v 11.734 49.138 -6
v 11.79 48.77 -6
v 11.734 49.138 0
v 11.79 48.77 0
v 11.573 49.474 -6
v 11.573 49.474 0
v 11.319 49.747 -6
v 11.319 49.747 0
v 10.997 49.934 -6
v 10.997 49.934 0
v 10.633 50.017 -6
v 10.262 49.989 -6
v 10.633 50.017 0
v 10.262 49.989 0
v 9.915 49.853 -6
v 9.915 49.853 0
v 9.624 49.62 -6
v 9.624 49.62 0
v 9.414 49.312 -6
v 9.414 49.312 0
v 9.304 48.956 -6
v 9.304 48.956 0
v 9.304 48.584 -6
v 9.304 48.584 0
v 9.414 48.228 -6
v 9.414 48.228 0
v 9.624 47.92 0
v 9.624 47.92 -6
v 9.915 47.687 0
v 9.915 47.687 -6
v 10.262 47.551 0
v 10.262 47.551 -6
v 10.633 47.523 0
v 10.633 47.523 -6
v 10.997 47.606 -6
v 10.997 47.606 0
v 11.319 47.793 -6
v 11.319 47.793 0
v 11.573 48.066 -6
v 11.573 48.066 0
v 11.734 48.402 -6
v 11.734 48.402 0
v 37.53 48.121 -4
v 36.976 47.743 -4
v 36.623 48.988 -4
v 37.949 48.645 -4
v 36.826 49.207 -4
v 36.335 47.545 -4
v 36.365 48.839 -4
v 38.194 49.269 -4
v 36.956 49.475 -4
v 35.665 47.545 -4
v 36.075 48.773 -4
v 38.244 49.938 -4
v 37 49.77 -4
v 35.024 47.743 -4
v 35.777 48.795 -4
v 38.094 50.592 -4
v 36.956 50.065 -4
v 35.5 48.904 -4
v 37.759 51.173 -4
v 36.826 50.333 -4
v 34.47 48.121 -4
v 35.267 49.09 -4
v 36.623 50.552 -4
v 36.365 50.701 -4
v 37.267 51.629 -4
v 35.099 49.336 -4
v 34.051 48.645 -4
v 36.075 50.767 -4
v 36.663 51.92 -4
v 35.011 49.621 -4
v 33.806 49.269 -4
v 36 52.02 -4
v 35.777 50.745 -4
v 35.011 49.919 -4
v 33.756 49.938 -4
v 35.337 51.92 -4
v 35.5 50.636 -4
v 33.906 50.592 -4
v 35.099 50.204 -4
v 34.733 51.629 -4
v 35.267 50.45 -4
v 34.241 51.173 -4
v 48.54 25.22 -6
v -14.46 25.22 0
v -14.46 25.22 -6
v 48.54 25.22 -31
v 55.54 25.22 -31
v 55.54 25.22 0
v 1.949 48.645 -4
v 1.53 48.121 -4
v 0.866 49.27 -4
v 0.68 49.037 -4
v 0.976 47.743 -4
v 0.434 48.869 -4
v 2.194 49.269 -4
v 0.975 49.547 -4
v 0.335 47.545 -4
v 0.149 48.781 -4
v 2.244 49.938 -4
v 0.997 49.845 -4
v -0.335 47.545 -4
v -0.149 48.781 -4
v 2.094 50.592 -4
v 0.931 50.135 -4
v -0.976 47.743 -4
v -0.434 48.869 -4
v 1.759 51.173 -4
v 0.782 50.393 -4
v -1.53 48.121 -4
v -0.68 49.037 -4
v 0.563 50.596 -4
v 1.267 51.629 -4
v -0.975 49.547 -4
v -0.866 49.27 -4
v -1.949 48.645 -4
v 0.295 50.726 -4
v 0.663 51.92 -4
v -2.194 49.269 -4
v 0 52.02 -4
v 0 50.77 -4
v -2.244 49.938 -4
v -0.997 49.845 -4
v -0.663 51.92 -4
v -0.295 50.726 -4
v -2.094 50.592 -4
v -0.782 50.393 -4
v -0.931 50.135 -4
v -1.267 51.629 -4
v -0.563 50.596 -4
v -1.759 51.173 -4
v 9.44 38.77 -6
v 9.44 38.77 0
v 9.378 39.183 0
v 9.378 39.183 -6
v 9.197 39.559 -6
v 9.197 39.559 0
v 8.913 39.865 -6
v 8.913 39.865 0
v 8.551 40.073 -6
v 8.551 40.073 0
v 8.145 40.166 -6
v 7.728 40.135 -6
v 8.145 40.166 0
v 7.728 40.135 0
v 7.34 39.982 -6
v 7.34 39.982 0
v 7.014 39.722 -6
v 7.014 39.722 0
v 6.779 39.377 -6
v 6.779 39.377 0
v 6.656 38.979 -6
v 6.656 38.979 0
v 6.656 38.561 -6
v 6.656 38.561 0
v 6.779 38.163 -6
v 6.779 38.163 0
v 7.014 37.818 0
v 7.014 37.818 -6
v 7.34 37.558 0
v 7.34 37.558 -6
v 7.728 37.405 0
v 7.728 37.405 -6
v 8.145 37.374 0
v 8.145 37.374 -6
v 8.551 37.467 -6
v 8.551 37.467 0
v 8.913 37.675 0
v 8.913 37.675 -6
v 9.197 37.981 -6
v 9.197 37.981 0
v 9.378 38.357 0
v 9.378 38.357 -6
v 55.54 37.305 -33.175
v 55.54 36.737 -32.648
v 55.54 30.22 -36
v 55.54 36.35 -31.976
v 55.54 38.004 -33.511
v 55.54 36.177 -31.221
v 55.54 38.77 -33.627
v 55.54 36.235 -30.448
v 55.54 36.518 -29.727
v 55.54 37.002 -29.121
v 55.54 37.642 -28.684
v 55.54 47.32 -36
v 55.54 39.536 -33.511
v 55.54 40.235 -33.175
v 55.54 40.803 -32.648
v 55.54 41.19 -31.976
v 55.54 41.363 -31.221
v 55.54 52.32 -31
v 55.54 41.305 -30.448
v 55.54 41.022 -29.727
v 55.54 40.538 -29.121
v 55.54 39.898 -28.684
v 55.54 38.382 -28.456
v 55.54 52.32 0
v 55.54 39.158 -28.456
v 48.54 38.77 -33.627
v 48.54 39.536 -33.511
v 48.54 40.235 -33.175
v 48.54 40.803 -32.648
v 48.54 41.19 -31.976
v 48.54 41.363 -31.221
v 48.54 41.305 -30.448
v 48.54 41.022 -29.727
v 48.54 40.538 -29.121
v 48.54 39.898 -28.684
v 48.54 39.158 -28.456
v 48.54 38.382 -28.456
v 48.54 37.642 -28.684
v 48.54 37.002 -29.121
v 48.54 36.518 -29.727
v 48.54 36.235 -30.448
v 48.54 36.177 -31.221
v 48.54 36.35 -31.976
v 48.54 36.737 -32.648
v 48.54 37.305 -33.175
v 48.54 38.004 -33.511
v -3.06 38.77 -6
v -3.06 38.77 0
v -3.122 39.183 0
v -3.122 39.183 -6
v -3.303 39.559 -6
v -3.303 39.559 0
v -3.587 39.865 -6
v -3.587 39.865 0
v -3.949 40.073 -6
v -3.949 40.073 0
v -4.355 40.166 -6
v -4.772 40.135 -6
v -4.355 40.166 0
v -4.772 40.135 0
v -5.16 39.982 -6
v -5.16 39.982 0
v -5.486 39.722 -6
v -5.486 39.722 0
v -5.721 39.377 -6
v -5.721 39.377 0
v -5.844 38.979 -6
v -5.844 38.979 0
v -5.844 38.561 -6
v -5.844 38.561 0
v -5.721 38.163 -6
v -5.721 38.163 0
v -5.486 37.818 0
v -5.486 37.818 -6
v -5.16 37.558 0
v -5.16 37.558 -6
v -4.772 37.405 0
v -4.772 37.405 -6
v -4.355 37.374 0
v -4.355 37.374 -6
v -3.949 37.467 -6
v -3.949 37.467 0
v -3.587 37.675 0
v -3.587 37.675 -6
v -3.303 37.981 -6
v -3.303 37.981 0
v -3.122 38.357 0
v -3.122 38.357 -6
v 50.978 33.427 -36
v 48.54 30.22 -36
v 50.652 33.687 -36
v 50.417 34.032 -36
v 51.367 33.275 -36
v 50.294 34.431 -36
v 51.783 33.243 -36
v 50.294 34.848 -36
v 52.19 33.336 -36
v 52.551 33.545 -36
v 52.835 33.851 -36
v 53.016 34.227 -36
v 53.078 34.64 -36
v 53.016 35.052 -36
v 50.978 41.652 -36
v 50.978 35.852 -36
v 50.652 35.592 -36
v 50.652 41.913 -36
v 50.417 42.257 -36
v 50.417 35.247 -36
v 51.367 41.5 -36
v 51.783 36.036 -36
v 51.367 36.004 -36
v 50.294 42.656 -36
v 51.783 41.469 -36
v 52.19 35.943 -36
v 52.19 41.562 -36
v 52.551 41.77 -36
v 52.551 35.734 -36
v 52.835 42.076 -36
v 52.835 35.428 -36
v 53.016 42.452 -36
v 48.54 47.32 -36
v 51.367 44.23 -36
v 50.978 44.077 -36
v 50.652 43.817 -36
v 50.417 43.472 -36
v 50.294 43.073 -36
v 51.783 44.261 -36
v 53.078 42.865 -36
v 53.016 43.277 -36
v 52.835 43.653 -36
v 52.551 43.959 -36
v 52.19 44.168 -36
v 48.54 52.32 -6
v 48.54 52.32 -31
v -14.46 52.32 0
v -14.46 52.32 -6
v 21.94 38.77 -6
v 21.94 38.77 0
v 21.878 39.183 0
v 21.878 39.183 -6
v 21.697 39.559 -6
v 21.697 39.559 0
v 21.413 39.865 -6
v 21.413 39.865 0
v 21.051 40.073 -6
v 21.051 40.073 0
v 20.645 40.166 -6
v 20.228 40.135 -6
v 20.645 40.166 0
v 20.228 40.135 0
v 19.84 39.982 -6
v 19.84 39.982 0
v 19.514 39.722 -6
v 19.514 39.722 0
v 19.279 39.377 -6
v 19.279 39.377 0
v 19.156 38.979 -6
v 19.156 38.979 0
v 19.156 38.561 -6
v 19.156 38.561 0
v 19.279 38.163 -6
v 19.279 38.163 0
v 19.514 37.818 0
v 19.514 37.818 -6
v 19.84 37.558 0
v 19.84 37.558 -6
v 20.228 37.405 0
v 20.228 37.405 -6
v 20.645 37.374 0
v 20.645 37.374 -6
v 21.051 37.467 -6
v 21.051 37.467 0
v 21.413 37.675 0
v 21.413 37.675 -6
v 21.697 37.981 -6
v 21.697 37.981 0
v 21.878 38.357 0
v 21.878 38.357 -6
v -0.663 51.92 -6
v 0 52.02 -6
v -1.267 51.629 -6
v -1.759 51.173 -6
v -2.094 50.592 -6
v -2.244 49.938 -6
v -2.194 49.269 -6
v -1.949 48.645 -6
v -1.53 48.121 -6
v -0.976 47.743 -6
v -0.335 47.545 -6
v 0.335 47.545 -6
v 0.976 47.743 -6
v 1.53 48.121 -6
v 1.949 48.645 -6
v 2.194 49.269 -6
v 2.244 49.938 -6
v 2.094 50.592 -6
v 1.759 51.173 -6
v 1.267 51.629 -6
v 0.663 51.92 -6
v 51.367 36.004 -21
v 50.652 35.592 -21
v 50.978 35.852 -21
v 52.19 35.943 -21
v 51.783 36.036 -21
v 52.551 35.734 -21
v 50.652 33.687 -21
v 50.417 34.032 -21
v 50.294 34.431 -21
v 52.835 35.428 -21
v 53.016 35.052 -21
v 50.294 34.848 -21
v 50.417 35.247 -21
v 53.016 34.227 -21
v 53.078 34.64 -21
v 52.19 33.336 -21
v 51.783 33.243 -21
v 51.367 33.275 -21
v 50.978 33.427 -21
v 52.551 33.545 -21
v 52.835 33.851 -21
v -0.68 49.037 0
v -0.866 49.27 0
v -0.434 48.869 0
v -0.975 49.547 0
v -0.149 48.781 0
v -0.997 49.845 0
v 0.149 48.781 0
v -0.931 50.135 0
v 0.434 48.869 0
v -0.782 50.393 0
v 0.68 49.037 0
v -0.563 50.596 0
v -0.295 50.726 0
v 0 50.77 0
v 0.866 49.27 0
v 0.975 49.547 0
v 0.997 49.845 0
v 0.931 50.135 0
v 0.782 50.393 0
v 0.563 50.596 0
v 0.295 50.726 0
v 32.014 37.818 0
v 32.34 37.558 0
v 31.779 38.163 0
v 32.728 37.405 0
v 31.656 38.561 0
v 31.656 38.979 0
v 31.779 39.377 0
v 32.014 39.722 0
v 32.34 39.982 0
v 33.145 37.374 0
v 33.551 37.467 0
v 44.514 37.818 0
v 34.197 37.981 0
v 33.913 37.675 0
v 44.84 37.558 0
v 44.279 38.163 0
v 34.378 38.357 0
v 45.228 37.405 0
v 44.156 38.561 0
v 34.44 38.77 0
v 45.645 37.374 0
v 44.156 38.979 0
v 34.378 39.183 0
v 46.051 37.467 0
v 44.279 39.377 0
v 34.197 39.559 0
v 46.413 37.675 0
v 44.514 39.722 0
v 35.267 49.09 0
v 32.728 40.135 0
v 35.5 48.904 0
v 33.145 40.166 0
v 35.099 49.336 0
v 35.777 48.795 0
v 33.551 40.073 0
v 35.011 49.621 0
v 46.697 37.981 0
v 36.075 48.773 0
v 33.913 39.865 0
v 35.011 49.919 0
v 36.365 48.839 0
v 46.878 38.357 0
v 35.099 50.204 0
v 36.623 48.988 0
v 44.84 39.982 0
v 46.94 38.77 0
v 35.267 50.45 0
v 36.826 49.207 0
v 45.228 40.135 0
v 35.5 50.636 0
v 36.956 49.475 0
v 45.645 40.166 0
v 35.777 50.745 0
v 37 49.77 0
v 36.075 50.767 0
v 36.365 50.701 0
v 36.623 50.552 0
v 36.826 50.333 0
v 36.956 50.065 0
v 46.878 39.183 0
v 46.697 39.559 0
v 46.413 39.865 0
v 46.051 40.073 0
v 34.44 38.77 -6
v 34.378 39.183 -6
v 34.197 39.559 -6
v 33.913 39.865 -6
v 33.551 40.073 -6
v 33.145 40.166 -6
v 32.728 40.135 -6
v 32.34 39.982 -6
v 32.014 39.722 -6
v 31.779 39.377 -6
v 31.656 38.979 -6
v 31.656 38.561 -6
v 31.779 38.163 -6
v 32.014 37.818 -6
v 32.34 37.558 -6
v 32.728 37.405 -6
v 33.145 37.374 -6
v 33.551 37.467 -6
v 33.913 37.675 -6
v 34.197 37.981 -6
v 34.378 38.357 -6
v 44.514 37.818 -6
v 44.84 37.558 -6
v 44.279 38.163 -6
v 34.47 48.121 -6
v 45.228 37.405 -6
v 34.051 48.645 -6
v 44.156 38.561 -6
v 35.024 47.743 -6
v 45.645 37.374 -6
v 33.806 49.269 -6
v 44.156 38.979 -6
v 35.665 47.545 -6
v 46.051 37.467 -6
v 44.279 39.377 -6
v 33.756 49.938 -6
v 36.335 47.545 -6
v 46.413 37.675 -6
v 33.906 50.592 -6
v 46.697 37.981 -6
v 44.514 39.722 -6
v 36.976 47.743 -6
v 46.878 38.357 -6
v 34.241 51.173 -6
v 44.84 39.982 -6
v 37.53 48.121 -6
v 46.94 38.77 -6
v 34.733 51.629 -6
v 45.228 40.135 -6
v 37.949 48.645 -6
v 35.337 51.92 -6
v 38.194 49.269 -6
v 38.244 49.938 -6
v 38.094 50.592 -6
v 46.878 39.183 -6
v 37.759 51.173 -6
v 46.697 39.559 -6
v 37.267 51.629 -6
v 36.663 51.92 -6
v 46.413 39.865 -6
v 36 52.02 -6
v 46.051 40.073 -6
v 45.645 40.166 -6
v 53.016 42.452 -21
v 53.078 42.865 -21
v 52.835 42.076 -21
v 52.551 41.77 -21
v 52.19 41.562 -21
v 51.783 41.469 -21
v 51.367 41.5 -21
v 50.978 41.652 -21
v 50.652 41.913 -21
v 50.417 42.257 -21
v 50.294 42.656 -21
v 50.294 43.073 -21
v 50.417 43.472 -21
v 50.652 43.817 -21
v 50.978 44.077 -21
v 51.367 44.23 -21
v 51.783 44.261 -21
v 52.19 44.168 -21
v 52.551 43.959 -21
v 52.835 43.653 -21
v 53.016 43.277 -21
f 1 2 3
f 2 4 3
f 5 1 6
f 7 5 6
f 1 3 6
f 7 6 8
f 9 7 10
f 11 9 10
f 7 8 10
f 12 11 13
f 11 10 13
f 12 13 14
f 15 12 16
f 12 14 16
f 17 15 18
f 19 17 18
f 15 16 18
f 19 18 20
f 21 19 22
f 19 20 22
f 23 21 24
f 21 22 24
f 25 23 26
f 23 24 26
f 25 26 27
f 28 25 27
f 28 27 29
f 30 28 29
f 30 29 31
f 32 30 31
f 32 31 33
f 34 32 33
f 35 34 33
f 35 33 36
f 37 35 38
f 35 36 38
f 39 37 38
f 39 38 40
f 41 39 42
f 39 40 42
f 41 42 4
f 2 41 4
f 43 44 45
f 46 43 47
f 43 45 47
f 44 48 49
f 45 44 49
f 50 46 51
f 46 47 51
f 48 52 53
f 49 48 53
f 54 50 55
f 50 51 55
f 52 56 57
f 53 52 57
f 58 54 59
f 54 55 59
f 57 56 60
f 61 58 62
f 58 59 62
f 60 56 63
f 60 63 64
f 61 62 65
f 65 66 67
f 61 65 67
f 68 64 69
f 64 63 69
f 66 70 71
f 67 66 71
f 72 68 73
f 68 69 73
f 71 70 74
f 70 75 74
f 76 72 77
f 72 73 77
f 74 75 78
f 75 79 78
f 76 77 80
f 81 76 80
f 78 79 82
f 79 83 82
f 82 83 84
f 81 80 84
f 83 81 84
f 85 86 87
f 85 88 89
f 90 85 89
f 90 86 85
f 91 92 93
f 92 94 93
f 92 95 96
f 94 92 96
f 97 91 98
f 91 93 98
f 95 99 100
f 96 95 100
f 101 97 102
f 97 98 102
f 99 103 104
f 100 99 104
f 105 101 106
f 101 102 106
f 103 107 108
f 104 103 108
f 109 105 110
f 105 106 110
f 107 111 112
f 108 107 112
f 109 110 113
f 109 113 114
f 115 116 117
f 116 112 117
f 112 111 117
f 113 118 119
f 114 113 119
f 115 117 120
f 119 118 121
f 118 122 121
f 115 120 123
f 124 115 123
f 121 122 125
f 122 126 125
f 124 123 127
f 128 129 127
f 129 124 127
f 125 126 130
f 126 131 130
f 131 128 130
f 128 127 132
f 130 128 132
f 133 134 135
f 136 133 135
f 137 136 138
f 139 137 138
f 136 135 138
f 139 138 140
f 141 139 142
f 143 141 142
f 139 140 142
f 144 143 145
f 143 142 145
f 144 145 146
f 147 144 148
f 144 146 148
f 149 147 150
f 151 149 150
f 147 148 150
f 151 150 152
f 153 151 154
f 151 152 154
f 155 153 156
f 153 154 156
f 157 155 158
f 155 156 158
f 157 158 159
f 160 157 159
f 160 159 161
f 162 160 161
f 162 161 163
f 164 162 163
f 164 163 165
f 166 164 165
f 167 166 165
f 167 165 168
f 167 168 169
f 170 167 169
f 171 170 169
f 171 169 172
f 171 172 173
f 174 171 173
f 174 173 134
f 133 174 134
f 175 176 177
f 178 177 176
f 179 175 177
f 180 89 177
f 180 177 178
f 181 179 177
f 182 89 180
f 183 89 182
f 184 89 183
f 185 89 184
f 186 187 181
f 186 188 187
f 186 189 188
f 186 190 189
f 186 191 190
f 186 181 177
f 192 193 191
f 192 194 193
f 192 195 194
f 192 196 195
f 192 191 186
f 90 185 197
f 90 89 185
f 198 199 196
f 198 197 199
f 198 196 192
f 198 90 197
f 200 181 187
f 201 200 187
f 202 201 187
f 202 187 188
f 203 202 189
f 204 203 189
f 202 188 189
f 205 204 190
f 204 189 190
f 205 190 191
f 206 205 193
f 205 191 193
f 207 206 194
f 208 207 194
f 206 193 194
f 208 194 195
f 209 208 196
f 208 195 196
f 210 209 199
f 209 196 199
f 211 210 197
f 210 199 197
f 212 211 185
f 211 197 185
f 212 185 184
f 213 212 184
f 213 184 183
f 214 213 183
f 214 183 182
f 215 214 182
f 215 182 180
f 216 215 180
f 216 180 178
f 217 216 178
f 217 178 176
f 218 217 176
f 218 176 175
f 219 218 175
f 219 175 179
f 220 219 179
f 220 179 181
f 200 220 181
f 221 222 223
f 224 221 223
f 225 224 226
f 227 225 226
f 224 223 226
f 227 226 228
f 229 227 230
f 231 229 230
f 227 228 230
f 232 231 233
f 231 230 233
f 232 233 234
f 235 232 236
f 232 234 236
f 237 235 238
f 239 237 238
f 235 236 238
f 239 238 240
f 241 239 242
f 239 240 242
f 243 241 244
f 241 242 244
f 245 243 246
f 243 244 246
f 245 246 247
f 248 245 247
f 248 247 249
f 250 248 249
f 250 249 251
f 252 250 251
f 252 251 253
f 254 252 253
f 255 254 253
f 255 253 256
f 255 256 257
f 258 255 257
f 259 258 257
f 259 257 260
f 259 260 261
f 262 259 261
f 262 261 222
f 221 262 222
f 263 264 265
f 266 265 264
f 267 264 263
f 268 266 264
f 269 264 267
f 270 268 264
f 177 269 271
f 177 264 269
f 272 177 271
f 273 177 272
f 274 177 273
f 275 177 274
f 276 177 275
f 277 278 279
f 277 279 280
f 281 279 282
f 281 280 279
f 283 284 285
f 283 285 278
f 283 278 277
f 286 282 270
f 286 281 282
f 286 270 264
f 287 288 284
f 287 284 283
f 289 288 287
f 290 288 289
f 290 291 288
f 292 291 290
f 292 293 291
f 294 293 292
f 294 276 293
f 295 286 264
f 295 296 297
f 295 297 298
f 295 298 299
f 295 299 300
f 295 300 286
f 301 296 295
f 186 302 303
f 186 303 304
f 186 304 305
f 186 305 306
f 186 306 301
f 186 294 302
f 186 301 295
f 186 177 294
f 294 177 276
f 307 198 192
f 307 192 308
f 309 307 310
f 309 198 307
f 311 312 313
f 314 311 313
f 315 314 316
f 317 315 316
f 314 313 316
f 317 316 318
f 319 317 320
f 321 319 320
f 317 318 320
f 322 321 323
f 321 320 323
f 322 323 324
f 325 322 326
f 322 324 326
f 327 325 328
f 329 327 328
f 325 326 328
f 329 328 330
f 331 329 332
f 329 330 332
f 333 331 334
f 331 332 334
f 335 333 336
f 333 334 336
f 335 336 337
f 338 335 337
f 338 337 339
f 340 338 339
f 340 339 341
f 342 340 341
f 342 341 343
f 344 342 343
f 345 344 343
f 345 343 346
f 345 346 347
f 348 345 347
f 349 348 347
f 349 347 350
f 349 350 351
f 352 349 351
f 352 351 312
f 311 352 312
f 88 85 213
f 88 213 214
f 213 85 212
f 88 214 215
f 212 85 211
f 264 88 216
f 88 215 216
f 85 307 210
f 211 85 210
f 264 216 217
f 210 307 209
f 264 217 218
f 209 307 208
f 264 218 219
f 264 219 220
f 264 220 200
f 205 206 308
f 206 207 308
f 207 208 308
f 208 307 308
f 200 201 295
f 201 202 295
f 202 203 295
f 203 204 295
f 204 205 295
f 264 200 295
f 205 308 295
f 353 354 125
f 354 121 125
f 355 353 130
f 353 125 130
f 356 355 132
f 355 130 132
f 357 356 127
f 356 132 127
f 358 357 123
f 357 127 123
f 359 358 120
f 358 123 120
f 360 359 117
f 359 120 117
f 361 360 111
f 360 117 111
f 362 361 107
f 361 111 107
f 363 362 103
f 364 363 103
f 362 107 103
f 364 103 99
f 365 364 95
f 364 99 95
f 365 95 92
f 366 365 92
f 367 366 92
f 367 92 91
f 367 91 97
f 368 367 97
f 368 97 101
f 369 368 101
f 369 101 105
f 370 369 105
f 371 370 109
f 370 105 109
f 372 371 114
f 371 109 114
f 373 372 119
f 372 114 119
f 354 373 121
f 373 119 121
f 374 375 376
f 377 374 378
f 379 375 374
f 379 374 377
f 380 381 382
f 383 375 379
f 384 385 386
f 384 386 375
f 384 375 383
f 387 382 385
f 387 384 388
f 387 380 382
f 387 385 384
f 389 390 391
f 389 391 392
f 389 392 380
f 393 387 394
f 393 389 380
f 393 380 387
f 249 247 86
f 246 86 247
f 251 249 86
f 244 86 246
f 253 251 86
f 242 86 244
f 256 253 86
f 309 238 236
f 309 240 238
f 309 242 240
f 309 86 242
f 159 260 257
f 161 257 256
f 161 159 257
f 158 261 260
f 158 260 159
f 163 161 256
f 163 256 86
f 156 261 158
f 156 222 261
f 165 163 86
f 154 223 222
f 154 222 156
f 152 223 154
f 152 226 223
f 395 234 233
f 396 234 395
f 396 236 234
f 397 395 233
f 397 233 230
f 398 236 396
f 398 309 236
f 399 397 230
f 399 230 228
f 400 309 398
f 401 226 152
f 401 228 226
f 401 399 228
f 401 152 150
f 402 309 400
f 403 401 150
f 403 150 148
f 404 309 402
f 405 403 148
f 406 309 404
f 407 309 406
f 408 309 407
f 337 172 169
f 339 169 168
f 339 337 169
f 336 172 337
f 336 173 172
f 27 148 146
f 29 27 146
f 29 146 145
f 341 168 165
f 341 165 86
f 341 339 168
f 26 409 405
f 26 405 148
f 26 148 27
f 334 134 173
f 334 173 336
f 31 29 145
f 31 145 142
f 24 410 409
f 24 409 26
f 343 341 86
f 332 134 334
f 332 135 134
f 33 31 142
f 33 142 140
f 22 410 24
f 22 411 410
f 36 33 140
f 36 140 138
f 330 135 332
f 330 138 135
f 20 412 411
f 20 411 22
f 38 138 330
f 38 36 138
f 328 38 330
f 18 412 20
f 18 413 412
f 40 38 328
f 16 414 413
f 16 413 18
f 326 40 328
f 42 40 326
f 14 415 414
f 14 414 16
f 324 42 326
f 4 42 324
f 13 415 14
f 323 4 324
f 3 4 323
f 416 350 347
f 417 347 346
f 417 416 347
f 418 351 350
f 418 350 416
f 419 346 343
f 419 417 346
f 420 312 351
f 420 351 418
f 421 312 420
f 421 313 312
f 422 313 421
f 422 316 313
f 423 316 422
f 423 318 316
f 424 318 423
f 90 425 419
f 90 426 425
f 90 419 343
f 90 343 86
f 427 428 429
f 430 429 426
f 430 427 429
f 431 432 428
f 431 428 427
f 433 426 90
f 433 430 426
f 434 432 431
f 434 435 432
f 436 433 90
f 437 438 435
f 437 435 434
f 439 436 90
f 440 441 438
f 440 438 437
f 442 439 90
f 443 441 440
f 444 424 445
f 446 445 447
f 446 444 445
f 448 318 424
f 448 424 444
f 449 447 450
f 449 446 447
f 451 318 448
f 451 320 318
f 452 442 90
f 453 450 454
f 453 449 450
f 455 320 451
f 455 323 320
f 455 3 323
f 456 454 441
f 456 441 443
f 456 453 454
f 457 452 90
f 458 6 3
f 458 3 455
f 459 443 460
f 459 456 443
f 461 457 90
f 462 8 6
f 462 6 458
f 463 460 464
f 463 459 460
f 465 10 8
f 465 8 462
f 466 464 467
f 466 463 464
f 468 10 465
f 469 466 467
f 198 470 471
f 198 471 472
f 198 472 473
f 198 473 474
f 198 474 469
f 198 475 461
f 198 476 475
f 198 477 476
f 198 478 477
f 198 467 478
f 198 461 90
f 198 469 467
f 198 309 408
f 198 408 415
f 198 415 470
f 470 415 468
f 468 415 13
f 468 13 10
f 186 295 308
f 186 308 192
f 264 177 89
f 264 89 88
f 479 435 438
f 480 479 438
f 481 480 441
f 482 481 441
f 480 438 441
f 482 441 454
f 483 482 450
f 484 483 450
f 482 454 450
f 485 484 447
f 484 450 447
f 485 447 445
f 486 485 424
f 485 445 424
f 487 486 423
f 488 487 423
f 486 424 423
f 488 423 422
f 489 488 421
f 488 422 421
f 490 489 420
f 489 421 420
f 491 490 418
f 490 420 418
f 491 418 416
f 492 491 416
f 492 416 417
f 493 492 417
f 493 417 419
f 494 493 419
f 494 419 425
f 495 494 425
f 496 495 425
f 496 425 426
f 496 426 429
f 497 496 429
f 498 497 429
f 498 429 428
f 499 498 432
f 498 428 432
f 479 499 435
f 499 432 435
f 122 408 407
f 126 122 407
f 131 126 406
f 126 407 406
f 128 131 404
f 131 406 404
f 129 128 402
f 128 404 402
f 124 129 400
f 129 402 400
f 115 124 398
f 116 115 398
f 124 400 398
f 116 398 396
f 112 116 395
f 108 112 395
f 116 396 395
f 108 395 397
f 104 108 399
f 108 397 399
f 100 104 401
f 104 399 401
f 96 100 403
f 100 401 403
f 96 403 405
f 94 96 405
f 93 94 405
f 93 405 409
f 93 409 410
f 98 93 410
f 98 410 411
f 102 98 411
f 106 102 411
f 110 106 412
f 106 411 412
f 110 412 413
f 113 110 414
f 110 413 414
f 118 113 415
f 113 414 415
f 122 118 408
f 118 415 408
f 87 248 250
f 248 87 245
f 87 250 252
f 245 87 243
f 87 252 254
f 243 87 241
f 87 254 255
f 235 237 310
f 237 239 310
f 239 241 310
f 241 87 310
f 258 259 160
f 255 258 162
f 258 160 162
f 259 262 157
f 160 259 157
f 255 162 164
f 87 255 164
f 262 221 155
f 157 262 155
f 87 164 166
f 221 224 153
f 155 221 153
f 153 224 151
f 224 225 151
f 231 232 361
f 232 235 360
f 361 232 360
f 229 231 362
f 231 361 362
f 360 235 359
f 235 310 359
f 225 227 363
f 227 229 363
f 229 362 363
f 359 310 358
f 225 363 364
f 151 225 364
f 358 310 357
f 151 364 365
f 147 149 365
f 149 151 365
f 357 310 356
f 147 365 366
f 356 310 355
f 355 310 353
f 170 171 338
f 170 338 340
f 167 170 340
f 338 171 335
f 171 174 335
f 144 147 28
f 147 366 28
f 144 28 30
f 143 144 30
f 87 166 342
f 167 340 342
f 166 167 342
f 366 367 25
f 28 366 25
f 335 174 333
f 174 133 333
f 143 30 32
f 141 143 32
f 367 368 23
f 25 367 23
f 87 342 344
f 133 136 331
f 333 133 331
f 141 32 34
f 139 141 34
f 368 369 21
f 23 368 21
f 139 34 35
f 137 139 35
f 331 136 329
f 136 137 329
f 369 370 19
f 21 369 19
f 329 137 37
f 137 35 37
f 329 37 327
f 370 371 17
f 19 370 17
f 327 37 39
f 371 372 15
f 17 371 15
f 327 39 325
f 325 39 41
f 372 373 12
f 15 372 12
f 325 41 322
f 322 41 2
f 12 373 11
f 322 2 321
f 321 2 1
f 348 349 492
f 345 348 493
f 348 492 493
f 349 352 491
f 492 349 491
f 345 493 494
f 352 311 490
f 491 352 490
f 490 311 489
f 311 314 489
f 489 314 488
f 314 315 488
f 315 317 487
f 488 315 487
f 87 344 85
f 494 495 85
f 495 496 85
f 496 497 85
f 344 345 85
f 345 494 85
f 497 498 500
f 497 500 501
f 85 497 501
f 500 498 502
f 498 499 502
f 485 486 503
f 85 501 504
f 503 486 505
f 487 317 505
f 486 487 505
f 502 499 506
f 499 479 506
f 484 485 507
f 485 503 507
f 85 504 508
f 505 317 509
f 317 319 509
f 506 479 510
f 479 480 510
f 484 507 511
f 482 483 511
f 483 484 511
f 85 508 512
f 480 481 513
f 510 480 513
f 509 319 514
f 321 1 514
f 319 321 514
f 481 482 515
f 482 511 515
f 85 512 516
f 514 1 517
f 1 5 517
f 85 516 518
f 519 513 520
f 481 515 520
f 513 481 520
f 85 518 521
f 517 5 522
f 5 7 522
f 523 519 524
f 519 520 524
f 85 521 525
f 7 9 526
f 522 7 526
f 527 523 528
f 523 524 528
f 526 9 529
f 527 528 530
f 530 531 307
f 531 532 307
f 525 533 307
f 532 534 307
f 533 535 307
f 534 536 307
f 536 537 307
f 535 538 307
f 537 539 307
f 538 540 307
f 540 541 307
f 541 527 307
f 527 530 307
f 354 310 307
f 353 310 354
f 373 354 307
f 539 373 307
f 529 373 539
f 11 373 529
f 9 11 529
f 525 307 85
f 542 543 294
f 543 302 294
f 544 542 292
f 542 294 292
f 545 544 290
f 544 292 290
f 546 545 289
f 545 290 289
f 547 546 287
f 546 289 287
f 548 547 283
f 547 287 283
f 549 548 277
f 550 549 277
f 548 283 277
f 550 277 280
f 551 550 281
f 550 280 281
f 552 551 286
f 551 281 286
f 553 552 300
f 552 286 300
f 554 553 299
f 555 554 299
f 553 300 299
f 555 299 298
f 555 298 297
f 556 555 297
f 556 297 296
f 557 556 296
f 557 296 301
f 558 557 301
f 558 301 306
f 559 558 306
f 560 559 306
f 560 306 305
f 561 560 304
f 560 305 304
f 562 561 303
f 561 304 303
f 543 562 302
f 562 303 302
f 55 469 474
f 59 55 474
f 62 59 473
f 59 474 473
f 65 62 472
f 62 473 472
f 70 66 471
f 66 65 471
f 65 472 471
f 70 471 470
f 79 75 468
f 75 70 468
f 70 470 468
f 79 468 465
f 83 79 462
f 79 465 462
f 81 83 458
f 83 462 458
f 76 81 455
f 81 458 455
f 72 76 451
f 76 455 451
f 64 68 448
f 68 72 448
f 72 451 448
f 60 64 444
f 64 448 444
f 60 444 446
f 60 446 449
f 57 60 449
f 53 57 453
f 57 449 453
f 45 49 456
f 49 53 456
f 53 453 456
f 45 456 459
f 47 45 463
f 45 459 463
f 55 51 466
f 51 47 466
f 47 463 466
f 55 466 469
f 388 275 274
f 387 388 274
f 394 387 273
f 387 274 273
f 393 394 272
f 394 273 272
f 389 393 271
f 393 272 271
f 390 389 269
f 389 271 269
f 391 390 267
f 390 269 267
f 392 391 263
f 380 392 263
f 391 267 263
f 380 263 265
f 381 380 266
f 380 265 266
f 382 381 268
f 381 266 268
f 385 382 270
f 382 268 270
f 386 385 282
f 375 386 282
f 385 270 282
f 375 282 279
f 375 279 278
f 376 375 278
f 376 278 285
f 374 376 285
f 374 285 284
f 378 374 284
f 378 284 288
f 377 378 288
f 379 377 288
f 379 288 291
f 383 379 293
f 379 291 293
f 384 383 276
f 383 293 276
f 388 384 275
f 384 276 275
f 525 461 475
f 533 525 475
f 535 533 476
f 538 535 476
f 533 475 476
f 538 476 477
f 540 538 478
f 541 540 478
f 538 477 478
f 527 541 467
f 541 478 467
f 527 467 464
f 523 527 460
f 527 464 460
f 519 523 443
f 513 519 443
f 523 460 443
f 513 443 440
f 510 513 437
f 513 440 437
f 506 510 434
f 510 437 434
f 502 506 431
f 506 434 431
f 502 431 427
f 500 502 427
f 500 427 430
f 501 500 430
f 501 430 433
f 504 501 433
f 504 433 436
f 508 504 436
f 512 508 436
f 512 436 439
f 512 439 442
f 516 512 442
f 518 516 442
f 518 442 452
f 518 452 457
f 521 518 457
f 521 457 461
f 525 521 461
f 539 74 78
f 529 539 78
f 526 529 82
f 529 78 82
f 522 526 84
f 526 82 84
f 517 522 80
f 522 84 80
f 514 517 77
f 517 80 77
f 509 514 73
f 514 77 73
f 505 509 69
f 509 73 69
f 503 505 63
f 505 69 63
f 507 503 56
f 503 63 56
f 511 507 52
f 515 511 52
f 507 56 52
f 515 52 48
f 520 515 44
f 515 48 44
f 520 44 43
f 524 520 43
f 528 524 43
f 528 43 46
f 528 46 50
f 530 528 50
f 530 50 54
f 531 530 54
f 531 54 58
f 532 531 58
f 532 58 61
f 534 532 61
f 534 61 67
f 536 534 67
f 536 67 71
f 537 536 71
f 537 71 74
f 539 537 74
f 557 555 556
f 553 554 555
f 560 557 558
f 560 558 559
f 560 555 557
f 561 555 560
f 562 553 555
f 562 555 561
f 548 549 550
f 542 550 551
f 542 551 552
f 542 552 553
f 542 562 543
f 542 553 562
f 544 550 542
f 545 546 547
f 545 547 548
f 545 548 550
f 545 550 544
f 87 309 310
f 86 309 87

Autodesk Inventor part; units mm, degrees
ref_plane "YZ Plane" through (0, 0, 0) normal (1, 0, 0) x (0, 1, 0)
ref_plane "XZ Plane" through (0, 0, 0) normal (0, 1, 0) x (-1, 0, 0)
ref_plane "Arbeitsebene1" through (0, 0, 0) normal (0, 0, 1) x (1, 0, 0)
sketch "Skizze1" plane through (0, 0, 0) normal (0, 0, 1) x (1, 0, 0)
  circle A0 centre (-64.84, -24.91) radius 1.5 projected
  circle A1 centre (85.34, -22.83) radius 1 projected
  circle A2 centre (85.34, -43.41) radius 1 projected
  circle A3 centre (-64.84, 35.59) radius 1.5 projected
  circle A4 centre (-11.66, -50.59) radius 1.5 projected
  circle A5 centre (85.34, 37.77) radius 1 projected
  circle A6 centre (54.34, -50.59) radius 1.5 projected
  circle A7 centre (85.34, 58.59) radius 1 projected
  line L0 (-89.84, 67.09) -> (89.84, 67.09) projected
  line L1 (-89.84, -67.09) -> (-89.84, 67.09) projected
  line L2 (89.84, -67.09) -> (-89.84, -67.09) projected
  line L3 (89.84, 67.09) -> (89.84, -67.09) projected
  arc A8 (-32.14, 53.27) -> (-37.14, 48.27) centre (-32.14, 48.27) ccw projected
  line L4 (73.22, 53.27) -> (-32.14, 53.27) projected
  arc A9 (78.22, 48.27) -> (73.22, 53.27) centre (73.22, 48.27) ccw projected
  line L5 (78.22, -36.73) -> (78.22, 48.27) projected
  arc A10 (73.22, -41.73) -> (78.22, -36.73) centre (73.22, -36.73) ccw projected
  line L6 (-32.14, -41.73) -> (73.22, -41.73) projected
  arc A11 (-37.14, -36.73) -> (-32.14, -41.73) centre (-32.14, -36.73) ccw projected
  line L7 (-37.14, 48.27) -> (-37.14, -36.73) projected
  circle A12 centre (37.4417, 38.67) radius 1.75 projected
  circle A13 centre (24.9417, 38.67) radius 1.75 projected
  circle A14 centre (12.4417, 38.67) radius 1.75 projected
  circle A15 centre (-0.0583, 38.67) radius 1.75 projected
  line L8 (-4.46, 32.72) -> (-4.46, 44.82) construction
  line L9 (-4.46, 32.72) -> (45.54, 32.72) projected
  line L10 (45.54, 32.72) -> (45.54, 44.82) construction
  line L11 (-4.46, 44.82) -> (45.54, 44.82) projected
  circle A16 centre (36, 49.77) radius 1 projected
  circle A17 centre (10.54, 48.77) radius 1.25 projected
  line L12 (55.54, 52.32) -> (-14.46, 52.32)
  line L13 (-14.46, 52.32) -> (-14.46, 25.22)
  line L14 (-14.46, 25.22) -> (55.54, 25.22)
  line L15 (55.54, 25.22) -> (55.54, 52.32)
  circle A18 centre (20.54, 38.77) radius 1.4
  circle A19 centre (33.04, 38.77) radius 1.4
  circle A20 centre (45.54, 38.77) radius 1.4
  circle A21 centre (8.04, 38.77) radius 1.4
  circle A22 centre (20.54, 38.77) radius 1.4
  circle A23 centre (33.04, 38.77) radius 1.4
  circle A24 centre (-4.46, 38.77) radius 1.4
  circle A25 centre (8.04, 38.77) radius 1.4
  circle A26 centre (20.54, 38.77) radius 1.4
  point P0 (0, 0)
  dimension "d0" = 10
  dimension "d1" = 10
  dimension "d2" = 7.5
  dimension "d3" = 7.5
  dimension "d4" = 2.8
  dimension "d7" = 12.5
  dimension "d10" = 12.5
ref_plane "Arbeitsebene2" through (-4.46, 32.72, -4) normal (0, 0, 1) x (1, 0, 0)
extrude "Extrusion1" add sketch "Skizze1" against normal blind 6 contours A12 | A13 | A14 | A15 | L15 L14 L13 L12
sketch "Skizze2" plane through (55.54, 25.22, -6) normal (0, 0, -1) x (-1, 0, 0)
  circle A0 centre (19.54, 24.55) radius 1 projected
  circle A1 centre (55.54, 24.55) radius 1 projected
  point P0 (55.54, -25.22)
hole "Bohrung1" at (0, 49.77, -6) at (36, 49.77, -6) direction (0, 0, 1) diameter 2 end through all counterbore diameter 4.5 counterbore depth 2
sketch "Skizze3" plane through (55.54, 25.22, 0) normal (1, 0, 0) x (0, 0, -1)
  line L0 (0, 27.1) -> (6, 27.1) projected
  line L1 (4, 27.1) -> (4, 0) projected
  line L2 (0, 0) -> (6, 0) projected
  line L3 (4, 0) -> (36, 0)
  line L4 (36, 0) -> (36, 27.1)
  line L5 (36, 27.1) -> (4, 27.1)
  line L6 (4, 27.1) -> (4, 0)
  circle A0 centre (31.0266, 13.55) radius 3.005 construction
  circle A1 centre (31.0266, 13.55) radius 2.8511 construction
  circle A2 centre (31.0266, 13.55) radius 2.6
  point P0 (0, -25.22)
  dimension "d22" = 32
  dimension "d44" = 5.2
extrude "Extrusion2" add sketch "Skizze3" against normal blind 7
chamfer "Fase1" distance 5 angle 45 2 edges at (52.04, 52.32, -36) (52.04, 25.22, -36)
sketch "Skizze4" plane through (-14.46, 52.32, -36) normal (0, 0, -1) x (1, 0, 0)
  circle A0 centre (66.1385, 17.6805) radius 1.4
  line L0 (69.238, 10.6988) -> (61.364, 10.6988)
  line L1 (69.238, 16.4011) -> (61.364, 16.4011)
  circle A1 centre (66.1385, 9.4552) radius 1.4
  point P0 (14.46, 52.32)
  dimension "d30" = 2.8
  dimension "d41" = 2.8
ref_plane "Arbeitsebene3" through (0, 0, -12.82) normal (0, 0, -1) x (-1, 0, 0)
extrude "Extrusion4" cut sketch "Skizze4" against normal blind 15
properties part number "30_XYTabel_Aliexpress_cellSTORM_xmount"
